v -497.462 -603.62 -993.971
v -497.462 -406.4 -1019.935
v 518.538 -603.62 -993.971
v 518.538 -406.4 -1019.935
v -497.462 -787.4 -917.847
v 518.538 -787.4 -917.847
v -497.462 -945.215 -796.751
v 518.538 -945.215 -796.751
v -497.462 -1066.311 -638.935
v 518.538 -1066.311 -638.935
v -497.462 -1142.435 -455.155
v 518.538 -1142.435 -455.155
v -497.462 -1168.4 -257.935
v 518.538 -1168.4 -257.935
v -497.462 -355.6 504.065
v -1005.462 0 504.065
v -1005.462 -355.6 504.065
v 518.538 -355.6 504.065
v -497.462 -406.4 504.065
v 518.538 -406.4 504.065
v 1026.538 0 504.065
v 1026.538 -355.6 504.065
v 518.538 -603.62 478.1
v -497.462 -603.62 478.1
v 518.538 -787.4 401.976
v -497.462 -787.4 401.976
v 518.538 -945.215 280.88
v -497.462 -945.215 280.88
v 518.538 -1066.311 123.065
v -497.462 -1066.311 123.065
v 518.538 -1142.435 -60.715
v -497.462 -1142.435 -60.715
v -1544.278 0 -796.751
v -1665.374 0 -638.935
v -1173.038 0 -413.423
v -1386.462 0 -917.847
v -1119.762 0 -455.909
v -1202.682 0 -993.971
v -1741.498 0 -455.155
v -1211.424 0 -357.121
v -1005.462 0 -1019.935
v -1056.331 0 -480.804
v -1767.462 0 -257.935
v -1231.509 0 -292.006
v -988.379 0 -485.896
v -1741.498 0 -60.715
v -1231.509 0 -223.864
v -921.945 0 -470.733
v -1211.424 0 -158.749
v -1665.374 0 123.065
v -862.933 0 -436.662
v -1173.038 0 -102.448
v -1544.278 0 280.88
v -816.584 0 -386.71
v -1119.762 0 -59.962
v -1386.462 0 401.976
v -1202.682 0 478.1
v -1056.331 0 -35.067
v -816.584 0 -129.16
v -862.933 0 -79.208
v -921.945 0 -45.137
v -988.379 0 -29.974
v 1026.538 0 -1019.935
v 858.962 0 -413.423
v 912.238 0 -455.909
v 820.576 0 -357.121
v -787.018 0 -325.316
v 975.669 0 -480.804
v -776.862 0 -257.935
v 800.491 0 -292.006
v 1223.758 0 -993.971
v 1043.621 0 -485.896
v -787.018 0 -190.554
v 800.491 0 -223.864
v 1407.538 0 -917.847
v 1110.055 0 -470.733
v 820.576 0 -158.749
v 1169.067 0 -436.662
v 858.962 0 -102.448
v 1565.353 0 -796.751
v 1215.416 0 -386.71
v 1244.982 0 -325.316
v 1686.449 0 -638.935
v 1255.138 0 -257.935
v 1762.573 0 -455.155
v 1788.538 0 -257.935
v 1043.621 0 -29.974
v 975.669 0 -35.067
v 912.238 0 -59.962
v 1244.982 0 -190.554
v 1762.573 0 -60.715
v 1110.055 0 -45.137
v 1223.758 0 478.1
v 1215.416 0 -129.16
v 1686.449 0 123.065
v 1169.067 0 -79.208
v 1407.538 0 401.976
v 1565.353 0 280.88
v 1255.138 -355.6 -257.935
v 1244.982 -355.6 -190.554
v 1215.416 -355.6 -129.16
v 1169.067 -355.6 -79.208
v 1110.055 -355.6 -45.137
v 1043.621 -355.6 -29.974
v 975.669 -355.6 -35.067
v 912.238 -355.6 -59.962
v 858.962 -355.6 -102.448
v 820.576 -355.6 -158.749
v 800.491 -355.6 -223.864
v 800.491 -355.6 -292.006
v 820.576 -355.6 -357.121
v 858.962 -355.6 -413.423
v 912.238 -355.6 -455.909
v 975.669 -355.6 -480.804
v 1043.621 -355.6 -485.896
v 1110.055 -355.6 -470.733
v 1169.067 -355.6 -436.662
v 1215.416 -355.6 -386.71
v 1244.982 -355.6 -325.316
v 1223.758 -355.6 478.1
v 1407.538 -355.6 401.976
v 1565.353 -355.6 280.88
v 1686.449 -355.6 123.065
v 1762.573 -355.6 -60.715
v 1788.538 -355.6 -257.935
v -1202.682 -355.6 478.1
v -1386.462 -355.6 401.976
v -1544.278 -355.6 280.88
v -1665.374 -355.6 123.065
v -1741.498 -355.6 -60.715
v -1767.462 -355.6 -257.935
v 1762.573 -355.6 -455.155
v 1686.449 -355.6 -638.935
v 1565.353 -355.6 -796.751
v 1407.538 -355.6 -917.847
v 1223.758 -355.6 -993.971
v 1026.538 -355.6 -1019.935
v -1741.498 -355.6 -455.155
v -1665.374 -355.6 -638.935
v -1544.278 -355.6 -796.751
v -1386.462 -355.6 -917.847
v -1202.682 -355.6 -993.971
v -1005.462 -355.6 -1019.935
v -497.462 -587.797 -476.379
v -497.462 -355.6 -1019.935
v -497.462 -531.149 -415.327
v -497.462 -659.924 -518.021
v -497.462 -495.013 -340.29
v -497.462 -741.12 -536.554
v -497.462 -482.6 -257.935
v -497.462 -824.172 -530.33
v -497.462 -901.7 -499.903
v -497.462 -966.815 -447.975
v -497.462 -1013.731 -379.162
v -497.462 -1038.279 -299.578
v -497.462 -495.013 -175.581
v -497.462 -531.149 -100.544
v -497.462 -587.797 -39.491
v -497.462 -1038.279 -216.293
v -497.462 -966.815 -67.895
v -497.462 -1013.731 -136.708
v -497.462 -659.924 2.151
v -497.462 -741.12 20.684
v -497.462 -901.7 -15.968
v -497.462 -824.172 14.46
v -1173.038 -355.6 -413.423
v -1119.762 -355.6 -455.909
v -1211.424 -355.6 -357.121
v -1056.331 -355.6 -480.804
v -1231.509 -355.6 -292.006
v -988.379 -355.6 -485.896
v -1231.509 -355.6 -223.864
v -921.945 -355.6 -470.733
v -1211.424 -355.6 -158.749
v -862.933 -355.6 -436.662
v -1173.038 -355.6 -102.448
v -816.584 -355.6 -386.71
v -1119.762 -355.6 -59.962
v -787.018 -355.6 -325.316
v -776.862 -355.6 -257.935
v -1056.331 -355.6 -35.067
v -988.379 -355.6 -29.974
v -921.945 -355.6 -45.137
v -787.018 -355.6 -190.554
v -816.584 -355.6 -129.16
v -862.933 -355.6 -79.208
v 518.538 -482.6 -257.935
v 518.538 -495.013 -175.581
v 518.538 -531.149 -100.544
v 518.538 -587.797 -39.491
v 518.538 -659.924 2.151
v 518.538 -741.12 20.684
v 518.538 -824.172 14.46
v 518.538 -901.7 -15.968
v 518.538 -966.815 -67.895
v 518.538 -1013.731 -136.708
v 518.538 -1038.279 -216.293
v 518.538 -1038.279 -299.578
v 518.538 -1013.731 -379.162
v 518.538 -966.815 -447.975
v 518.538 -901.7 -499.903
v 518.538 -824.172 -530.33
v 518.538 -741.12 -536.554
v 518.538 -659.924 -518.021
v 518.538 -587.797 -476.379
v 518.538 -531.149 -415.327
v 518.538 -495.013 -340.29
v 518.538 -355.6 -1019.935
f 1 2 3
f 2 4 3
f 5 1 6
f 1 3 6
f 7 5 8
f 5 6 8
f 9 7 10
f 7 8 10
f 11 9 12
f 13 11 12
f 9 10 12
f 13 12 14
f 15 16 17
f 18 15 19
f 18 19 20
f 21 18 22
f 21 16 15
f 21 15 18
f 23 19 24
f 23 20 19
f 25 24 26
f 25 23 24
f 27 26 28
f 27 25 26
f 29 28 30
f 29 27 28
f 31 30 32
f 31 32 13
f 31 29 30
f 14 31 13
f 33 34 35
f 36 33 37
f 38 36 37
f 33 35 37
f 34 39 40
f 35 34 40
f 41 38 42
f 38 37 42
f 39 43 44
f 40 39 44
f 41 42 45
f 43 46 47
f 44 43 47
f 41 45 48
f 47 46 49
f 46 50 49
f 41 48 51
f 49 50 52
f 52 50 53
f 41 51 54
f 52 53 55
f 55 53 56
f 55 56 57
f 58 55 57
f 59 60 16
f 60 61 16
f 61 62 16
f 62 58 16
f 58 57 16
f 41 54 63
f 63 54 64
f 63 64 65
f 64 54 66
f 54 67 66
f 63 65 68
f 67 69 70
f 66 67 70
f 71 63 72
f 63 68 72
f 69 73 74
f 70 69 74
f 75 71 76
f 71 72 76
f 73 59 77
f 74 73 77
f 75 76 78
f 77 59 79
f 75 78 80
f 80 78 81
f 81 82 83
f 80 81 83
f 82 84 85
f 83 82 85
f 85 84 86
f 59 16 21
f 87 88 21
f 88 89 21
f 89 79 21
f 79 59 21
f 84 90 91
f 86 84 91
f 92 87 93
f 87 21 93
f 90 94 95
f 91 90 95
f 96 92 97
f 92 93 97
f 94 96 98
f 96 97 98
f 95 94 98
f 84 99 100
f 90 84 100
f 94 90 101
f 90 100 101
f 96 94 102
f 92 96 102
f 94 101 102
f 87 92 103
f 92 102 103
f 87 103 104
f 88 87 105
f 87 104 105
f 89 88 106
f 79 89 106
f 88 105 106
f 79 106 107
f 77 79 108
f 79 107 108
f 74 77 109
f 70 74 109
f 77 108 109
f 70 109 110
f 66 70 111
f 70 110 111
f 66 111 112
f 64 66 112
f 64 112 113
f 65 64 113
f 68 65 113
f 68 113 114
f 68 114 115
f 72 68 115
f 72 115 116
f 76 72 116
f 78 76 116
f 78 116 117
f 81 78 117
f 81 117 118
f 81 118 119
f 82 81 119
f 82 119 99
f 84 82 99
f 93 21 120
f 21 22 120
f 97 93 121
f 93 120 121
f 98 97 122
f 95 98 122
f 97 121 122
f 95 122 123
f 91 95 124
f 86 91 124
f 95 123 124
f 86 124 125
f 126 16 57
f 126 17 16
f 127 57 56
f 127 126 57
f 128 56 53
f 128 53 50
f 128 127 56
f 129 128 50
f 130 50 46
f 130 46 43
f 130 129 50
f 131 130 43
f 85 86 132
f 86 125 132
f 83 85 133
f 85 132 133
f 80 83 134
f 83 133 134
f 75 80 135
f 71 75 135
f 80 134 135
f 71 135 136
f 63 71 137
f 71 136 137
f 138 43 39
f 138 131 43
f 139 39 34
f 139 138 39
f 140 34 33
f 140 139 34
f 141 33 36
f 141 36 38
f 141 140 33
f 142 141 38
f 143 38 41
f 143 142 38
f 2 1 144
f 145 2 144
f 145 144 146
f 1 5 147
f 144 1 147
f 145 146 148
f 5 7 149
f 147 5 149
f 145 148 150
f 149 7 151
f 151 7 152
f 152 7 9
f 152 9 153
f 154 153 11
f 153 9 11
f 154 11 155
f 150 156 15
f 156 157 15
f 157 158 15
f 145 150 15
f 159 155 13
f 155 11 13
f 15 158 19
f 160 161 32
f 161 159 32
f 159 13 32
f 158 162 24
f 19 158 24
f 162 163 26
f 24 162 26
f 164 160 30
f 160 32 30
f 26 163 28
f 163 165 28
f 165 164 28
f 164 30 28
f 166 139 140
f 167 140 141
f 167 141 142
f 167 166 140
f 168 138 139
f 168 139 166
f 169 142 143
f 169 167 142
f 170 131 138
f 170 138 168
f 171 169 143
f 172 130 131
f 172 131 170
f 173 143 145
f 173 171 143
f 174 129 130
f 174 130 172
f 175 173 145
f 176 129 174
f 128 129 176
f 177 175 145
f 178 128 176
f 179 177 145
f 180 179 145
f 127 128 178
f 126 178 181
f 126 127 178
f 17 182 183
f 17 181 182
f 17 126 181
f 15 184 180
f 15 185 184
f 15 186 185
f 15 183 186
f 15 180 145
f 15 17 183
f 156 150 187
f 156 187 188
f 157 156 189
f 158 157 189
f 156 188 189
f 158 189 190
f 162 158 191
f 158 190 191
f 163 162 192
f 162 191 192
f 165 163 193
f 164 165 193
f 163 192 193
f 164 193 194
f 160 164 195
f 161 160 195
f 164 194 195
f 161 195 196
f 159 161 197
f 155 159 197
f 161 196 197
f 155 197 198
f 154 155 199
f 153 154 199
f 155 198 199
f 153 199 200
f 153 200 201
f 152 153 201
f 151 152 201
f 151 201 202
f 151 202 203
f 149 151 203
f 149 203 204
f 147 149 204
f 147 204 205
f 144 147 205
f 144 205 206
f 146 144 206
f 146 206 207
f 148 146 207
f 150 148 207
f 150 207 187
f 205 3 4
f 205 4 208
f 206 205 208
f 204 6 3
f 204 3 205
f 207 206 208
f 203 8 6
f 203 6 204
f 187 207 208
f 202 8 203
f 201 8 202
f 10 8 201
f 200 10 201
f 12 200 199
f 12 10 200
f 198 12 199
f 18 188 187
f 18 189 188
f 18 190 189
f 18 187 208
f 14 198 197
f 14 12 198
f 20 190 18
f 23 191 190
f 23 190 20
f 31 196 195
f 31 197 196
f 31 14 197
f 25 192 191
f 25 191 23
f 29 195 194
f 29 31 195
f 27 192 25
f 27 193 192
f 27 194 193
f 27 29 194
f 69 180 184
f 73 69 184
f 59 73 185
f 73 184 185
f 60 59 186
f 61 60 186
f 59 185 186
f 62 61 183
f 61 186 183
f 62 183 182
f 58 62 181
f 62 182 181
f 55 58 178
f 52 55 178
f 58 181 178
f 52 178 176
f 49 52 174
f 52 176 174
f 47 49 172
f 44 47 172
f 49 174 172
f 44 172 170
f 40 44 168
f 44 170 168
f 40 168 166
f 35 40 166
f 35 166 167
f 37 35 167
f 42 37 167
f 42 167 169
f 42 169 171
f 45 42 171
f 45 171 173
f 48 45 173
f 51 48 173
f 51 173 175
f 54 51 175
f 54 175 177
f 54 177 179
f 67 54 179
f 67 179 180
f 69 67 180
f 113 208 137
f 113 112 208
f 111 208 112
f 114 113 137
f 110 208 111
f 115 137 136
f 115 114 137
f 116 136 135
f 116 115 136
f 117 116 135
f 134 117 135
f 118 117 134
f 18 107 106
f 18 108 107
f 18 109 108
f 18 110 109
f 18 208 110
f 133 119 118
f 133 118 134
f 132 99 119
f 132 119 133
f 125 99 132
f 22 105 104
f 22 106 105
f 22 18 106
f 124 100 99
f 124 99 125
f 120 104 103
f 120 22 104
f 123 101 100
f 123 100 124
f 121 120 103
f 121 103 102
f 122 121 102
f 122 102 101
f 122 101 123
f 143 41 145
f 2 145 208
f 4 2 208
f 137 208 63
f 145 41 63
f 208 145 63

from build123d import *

# Parameters (mm, degrees)
F0_W      = 3556
F0_H      = 1524
F1_DEPTH  = 1168.4
F2_W      = 1505.427623216
F2_H      = 2067.9539636784
F3_DEPTH  = 812.8
F4_W      = 1708.8952731906
F4_H      = 3574.3826215129
F5_DEPTH  = 812.8
F6_R      = 761.99999
F7_R      = 761.99999
F9_R      = 228.6
F10_DEPTH = 355.601
F8_R      = 228.6
F11_DEPTH = 355.601
F12_R     = 279.4
F13_DEPTH = 2286.001


# Not quite as in the source:
# - a fillet or chamfer is up to 0.001 mm smaller than in the source, because OpenCascade refuses the exact size


with BuildPart() as f1:
    # F0 (on Front) → F1 (new body)
    with BuildSketch(Plane.XZ):
        with Locations((10.5376988649, -257.9351535461)):
            Rectangle(F0_W, F0_H)
    extrude(amount=F1_DEPTH)

    # F2 (on face) → F3 (cut)
    with BuildSketch(Plane.XZ.offset(1168.4)):
        with Locations((-1250.1761127431, -206.1067819595)):
            Rectangle(F2_W, F2_H)
    extrude(amount=-F3_DEPTH, mode=Mode.SUBTRACT)

    # F4 (on face) → F5 (cut)
    with BuildSketch(Plane.XZ.offset(1168.4)):
        with Locations((1372.9853354602, -353.8175821304)):
            Rectangle(F4_W, F4_H)
    extrude(amount=-F5_DEPTH, mode=Mode.SUBTRACT)

    # F6 (radius 762 in the source; OpenCascade refuses exactly that, so slightly less here)
    f6_edges = [f1.edges().sort_by_distance(p)[0] for p in [
        (10.537699, -1168.4, 504.064846),
        (10.537699, -1168.4, -1019.935154),
    ]]
    fillet(f6_edges, radius=F6_R)

    # F7 (radius 762 in the source; OpenCascade refuses exactly that, so slightly less here)
    f7_edges = [f1.edges().sort_by_distance(p)[0] for p in [
        (1788.537699, -177.8, -1019.935154),
        (1788.537699, -177.8, 504.064846),
        (-1767.462301, -177.8, 504.064846),
        (-1767.462301, -177.8, -1019.935154),
    ]]
    fillet(f7_edges, radius=F7_R)

    # F9 (on face) → F10 (cut, through all)
    with BuildSketch(Plane.XZ.offset(355.6)):
        with Locations((1026.5376988649, -257.9351535461)):
            Circle(F9_R)
    extrude(amount=-F10_DEPTH, mode=Mode.SUBTRACT)

    # F8 (on face) → F11 (cut, through all)
    with BuildSketch(Plane.XZ.offset(355.6)):
        with Locations((-1005.4623011351, -257.9351535461)):
            Circle(F8_R)
    extrude(amount=-F11_DEPTH, mode=Mode.SUBTRACT)

    # F12 (on face) → F13 (cut, through all)
    with BuildSketch(Plane.YZ.offset(518.5376988649)):
        with Locations((-762, -257.9351535461)):
            Circle(F12_R)
    extrude(amount=-F13_DEPTH, mode=Mode.SUBTRACT)


solid = f1.part
